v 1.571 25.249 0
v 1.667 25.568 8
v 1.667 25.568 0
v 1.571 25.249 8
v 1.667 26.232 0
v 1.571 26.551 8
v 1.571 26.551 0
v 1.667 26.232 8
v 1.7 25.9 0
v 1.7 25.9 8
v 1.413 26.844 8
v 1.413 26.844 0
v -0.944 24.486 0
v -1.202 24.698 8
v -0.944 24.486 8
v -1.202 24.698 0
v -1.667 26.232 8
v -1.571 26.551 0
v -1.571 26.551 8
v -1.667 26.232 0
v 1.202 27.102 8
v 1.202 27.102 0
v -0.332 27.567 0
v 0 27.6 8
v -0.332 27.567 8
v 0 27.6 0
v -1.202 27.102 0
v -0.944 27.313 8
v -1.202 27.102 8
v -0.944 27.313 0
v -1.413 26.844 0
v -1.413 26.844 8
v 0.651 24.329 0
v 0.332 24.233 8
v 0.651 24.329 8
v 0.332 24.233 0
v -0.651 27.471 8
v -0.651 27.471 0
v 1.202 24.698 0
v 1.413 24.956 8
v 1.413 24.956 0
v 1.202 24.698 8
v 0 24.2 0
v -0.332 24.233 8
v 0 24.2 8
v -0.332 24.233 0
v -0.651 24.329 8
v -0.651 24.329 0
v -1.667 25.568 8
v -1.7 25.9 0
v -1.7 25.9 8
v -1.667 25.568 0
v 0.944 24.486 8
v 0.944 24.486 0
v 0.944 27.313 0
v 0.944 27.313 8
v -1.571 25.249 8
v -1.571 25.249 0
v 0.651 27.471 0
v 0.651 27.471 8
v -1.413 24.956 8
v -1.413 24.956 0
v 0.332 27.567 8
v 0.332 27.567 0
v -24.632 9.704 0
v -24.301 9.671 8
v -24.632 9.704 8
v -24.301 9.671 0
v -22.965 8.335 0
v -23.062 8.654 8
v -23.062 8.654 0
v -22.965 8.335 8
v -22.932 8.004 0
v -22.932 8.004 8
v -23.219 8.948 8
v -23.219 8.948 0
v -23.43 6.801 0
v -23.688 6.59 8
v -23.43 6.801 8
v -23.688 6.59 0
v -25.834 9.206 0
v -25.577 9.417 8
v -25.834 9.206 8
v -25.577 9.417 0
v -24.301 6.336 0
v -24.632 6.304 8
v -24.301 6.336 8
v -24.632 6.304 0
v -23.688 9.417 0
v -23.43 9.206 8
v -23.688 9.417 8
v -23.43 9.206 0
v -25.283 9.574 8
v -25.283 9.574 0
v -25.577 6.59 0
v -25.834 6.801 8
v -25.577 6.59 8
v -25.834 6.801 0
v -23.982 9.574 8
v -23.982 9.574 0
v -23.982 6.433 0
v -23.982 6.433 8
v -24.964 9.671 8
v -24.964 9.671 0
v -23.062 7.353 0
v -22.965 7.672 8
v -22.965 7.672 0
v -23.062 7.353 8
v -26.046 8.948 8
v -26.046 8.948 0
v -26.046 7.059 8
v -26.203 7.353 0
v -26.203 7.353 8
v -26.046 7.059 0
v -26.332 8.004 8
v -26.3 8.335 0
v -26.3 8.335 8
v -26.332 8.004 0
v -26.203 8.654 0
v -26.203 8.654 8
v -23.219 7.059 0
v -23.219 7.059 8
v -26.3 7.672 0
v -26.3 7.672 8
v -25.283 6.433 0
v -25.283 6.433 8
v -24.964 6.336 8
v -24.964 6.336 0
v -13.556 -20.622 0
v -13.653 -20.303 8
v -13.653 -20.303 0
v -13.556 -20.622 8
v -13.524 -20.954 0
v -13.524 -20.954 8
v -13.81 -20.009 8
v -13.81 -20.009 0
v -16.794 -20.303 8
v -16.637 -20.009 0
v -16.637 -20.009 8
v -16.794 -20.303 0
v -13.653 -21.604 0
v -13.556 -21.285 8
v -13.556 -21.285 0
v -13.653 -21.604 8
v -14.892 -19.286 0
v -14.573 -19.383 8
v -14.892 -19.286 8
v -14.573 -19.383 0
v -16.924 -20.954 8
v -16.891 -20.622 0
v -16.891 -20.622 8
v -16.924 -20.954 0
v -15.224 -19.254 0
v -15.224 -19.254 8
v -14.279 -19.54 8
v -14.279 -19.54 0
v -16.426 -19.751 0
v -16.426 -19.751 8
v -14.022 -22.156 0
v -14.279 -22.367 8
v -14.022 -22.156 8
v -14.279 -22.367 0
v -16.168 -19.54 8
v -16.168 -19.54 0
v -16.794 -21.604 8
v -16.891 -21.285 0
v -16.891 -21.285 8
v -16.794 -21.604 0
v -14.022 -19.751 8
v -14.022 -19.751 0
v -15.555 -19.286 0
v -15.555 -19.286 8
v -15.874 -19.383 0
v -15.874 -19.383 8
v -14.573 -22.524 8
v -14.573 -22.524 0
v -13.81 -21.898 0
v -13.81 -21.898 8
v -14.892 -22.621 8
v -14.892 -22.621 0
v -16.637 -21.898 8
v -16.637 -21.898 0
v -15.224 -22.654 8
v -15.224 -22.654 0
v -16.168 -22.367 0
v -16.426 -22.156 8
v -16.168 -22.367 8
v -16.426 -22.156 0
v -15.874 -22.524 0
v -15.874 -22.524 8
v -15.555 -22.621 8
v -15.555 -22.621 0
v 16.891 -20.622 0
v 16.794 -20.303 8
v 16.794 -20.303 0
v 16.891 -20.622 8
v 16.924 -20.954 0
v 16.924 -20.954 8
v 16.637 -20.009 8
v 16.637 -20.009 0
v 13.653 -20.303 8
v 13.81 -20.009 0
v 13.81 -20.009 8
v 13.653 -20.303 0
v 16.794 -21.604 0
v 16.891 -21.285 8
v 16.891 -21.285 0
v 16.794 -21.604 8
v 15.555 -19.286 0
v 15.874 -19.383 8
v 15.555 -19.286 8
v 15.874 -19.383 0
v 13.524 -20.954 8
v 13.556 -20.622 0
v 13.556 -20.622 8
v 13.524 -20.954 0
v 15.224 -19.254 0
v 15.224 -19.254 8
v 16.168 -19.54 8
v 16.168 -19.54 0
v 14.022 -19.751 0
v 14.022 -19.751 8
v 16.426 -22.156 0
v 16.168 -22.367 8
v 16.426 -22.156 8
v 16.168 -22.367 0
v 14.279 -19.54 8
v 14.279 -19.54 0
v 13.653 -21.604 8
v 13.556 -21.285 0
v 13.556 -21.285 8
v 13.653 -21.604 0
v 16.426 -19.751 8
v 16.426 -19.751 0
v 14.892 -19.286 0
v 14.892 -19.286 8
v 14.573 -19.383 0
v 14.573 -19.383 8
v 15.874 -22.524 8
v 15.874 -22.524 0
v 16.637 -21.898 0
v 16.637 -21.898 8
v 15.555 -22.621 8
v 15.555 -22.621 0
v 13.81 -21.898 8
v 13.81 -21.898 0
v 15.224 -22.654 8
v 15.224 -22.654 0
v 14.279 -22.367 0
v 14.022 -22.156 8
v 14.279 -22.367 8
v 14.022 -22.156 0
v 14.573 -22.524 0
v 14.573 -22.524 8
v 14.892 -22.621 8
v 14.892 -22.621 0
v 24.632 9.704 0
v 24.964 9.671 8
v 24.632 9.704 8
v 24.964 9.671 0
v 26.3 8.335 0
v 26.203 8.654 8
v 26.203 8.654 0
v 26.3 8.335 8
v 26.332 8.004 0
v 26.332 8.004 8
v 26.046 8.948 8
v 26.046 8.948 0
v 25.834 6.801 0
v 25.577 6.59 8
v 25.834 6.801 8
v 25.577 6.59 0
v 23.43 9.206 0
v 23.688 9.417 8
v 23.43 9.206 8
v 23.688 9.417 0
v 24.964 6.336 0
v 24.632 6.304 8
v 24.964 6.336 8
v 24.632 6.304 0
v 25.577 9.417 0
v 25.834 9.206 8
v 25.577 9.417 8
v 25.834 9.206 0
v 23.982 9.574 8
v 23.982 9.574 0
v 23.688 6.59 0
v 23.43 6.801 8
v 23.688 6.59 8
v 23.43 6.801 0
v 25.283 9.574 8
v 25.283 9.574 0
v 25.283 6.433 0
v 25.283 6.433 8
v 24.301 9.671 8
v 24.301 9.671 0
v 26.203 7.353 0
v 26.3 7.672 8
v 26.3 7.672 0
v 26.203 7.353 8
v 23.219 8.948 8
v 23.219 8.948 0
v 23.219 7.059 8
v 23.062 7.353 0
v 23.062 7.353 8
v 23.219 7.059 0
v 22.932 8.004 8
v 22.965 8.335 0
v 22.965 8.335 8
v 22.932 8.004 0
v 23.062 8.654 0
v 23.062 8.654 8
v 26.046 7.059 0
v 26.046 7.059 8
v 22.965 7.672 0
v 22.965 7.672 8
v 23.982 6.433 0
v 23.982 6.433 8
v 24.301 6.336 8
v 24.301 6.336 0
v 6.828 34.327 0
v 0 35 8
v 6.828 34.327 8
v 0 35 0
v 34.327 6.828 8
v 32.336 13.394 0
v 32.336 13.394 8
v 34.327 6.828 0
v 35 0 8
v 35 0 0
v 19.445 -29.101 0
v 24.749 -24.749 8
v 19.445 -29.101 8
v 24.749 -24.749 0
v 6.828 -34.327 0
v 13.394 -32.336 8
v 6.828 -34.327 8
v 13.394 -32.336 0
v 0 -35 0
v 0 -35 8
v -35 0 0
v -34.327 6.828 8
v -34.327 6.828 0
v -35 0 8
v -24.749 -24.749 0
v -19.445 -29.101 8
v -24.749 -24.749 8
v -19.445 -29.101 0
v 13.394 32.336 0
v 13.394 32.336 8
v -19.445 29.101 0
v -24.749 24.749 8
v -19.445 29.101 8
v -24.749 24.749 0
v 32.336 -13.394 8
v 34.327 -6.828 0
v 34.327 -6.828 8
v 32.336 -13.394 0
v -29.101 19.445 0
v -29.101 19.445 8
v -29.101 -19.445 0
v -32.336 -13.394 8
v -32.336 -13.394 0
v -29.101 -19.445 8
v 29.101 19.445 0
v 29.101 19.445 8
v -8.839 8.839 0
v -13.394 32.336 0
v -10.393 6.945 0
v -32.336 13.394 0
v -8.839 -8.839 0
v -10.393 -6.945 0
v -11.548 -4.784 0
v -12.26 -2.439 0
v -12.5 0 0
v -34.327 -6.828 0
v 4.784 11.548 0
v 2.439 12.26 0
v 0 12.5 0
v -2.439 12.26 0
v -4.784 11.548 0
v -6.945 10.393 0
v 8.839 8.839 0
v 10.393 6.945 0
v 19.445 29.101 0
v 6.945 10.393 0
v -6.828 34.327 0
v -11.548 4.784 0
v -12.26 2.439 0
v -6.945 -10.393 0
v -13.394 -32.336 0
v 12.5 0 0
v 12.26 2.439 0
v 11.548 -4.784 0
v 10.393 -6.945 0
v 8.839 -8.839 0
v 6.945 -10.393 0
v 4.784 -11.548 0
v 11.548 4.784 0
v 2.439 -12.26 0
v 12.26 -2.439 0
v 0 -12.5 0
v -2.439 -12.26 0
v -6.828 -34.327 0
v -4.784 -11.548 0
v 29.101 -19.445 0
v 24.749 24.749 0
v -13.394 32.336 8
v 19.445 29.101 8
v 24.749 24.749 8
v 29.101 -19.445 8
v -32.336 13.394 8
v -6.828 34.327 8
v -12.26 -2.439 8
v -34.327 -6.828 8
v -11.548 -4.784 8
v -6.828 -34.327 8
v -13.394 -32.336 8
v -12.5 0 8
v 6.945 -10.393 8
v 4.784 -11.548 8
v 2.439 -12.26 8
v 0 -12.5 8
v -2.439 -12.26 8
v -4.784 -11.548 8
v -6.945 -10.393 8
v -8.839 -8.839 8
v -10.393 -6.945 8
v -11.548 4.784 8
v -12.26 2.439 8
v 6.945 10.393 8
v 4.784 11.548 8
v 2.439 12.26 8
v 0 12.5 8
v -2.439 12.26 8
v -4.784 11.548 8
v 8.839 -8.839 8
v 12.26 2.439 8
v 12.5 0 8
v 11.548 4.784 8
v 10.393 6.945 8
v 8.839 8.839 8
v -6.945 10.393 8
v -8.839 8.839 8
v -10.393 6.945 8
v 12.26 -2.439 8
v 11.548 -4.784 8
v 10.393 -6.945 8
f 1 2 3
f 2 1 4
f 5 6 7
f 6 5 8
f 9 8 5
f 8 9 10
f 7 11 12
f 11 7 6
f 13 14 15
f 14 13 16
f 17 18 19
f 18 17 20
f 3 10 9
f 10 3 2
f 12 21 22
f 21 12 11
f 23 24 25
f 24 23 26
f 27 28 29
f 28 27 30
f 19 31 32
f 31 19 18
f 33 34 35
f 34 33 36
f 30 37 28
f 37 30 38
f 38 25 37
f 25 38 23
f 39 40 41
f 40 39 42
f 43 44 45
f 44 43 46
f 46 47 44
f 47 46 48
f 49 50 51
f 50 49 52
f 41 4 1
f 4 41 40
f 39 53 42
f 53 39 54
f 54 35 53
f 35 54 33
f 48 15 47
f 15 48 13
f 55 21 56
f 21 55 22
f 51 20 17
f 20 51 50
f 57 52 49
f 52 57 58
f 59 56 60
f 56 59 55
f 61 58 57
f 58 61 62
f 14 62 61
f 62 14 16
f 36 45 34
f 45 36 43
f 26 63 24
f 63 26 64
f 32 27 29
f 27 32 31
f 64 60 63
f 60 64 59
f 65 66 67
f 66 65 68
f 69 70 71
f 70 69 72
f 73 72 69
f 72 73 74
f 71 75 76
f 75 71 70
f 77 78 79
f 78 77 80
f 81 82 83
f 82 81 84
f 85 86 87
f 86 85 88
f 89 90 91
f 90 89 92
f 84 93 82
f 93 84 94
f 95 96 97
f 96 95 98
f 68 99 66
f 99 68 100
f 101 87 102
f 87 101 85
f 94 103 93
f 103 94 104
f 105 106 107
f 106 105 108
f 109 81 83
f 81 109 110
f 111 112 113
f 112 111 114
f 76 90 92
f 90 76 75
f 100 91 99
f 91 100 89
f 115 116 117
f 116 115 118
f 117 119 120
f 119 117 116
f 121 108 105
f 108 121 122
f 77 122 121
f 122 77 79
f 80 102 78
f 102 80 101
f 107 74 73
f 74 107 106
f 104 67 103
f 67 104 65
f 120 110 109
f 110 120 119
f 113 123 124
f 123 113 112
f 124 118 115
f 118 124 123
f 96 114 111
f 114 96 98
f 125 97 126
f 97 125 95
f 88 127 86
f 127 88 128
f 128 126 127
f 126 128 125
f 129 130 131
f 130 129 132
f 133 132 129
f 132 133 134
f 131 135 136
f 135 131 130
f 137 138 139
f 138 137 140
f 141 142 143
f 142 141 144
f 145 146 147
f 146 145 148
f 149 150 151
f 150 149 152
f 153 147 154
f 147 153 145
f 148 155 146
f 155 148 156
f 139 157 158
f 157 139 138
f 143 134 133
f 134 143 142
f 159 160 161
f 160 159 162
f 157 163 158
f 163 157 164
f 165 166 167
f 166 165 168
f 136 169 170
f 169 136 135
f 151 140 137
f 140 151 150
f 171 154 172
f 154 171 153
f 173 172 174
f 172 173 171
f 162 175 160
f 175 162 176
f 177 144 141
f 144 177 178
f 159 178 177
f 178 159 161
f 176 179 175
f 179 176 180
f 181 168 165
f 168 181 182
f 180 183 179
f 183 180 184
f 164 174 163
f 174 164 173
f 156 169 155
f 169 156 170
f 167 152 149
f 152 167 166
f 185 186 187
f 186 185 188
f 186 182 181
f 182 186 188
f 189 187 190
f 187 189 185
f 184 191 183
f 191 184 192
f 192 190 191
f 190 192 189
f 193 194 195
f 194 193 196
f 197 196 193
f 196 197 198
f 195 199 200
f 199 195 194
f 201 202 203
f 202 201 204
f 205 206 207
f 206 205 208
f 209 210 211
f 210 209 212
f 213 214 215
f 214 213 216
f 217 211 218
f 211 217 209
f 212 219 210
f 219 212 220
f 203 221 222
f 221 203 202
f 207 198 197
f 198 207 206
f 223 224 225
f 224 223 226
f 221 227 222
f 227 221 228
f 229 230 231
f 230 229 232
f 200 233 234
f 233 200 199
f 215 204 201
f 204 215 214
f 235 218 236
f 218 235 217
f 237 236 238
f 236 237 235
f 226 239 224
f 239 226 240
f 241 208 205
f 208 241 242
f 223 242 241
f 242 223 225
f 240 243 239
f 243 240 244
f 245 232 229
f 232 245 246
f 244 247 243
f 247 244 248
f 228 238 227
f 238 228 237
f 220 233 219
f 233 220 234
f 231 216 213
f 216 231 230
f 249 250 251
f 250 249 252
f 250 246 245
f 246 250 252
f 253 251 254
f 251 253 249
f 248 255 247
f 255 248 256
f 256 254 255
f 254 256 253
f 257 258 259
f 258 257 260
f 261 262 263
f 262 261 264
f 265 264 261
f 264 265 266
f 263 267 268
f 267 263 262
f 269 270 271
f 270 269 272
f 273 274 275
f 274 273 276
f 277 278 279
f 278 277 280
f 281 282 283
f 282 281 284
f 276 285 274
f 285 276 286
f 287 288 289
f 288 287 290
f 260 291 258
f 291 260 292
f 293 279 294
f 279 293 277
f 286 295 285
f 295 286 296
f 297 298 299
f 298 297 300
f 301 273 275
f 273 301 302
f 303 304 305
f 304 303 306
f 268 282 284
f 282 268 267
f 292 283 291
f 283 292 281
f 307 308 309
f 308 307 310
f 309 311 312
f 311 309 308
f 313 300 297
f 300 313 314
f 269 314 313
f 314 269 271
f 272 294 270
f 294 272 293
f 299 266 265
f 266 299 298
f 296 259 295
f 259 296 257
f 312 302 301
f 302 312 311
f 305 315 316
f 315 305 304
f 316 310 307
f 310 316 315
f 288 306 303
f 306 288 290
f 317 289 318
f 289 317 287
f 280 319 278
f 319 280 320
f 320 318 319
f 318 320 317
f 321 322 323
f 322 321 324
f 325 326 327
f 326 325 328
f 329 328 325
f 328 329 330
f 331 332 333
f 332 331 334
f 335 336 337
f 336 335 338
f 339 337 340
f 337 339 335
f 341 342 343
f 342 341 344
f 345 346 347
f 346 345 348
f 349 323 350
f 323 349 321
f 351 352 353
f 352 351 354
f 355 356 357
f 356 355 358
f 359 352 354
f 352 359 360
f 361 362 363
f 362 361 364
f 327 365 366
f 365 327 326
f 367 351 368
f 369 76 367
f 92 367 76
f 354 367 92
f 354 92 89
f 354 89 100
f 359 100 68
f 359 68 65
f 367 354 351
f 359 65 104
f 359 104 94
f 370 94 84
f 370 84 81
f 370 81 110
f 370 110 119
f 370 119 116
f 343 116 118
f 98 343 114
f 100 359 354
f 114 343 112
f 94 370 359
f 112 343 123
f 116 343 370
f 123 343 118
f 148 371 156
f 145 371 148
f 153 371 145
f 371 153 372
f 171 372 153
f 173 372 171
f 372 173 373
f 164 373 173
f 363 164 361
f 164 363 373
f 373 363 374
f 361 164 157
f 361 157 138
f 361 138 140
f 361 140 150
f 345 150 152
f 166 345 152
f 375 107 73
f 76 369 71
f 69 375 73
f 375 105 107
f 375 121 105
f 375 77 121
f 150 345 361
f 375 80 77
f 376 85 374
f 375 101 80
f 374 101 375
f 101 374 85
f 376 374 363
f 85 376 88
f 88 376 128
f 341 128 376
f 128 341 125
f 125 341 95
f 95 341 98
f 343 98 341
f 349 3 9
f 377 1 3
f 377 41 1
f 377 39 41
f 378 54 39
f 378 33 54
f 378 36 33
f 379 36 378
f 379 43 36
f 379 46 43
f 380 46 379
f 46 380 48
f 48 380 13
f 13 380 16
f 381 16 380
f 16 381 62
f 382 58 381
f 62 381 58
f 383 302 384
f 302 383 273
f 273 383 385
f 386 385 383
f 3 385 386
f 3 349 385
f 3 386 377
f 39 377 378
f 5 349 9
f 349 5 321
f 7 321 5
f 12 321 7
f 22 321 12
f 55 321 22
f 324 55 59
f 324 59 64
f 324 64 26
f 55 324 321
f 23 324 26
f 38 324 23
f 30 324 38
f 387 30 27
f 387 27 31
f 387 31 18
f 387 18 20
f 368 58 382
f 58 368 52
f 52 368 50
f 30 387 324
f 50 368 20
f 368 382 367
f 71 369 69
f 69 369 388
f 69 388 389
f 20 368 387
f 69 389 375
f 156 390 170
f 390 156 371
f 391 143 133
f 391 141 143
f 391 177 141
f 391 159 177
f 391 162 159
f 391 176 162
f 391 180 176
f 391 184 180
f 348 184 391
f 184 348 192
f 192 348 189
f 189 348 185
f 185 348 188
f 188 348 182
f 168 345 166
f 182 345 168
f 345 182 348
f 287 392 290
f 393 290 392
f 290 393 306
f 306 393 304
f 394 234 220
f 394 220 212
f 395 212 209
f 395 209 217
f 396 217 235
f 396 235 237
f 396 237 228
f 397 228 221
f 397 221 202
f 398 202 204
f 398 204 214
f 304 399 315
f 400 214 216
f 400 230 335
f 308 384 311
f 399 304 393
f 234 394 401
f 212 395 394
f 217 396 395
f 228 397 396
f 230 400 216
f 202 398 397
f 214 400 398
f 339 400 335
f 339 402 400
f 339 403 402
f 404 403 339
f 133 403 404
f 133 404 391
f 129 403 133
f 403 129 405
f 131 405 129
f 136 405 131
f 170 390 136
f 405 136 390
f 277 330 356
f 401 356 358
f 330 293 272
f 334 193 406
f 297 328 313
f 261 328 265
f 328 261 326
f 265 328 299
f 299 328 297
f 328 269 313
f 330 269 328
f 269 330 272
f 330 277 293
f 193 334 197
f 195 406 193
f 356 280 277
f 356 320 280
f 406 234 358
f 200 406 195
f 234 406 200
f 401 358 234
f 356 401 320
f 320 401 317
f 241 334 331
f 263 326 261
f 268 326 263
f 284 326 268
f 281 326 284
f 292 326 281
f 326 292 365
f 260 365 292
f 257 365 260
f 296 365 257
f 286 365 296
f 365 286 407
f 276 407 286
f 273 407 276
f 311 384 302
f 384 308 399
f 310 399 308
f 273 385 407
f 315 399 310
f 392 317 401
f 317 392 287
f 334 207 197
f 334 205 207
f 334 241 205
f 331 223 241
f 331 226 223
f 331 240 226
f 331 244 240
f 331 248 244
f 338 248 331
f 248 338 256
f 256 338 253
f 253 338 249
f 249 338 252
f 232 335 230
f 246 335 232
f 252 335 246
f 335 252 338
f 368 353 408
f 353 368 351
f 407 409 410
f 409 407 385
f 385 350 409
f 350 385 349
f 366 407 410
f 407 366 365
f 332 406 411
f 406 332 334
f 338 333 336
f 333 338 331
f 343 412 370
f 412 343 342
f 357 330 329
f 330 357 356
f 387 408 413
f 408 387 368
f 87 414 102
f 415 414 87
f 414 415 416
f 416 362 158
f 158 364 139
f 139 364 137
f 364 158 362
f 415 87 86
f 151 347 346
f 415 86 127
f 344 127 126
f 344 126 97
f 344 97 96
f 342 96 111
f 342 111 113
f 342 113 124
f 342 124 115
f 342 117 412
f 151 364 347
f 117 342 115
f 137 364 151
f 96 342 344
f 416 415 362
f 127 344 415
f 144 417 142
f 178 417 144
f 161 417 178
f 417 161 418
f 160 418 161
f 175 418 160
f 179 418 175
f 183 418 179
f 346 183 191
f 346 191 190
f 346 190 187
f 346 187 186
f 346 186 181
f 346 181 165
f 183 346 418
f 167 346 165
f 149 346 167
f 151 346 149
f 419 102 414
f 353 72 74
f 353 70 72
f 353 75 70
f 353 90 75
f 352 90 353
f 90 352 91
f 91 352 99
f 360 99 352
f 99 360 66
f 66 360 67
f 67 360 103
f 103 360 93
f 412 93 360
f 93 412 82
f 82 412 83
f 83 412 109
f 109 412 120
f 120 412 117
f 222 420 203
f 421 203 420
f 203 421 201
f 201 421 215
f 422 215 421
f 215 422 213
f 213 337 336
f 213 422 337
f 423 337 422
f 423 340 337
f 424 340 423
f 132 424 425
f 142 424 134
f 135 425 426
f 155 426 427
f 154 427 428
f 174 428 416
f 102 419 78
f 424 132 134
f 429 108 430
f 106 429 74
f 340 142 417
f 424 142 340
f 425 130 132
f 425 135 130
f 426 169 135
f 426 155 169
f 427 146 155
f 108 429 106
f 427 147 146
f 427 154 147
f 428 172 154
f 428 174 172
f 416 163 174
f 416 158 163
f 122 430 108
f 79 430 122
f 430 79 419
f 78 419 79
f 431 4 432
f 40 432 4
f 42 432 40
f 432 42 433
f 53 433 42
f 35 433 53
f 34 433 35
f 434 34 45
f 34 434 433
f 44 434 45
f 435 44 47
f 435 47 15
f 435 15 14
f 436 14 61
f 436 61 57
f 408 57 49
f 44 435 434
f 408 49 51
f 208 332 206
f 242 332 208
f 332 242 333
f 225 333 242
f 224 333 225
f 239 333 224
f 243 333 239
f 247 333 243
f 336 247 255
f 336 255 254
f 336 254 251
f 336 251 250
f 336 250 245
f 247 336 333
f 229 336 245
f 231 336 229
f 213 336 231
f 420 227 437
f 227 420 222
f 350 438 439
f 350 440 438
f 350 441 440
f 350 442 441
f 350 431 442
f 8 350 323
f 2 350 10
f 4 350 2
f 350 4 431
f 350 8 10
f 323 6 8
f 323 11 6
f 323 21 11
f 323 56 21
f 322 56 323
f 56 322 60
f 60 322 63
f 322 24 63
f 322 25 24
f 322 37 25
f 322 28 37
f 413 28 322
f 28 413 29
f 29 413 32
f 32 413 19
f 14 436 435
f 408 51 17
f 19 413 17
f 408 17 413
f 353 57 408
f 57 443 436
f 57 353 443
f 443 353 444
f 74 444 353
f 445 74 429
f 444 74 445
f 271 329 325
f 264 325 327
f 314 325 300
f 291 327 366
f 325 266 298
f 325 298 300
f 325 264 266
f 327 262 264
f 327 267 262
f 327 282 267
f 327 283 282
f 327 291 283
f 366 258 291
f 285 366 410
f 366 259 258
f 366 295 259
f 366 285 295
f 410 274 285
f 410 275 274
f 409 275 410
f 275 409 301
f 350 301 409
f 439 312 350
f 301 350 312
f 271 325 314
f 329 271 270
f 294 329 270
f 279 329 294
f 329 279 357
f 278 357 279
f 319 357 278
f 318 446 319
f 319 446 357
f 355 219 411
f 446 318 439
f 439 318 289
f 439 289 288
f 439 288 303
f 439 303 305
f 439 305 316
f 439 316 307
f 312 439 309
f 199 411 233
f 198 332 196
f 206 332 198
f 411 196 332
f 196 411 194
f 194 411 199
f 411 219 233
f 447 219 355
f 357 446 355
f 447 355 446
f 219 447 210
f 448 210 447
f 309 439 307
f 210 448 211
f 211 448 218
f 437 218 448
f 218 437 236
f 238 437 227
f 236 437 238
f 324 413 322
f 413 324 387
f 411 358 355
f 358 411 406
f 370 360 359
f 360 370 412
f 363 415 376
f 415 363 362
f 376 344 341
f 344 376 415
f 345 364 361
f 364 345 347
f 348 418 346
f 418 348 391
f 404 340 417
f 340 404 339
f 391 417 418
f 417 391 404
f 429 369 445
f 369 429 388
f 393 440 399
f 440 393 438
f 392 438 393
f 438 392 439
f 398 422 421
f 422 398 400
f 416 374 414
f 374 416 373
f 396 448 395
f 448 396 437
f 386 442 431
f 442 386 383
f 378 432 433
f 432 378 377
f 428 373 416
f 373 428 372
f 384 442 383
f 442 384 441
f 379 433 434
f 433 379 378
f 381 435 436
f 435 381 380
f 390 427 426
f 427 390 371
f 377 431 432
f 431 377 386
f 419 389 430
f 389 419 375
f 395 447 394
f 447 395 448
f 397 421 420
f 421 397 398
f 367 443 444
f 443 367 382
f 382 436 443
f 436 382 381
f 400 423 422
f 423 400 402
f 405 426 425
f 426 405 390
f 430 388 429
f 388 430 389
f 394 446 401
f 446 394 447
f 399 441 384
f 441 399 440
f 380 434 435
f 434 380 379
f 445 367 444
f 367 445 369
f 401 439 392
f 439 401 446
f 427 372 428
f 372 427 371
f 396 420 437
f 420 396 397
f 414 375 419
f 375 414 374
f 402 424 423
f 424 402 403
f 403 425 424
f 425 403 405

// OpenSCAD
$fn = 32;

// ----------------------------------------------------------------------
// Flange Ø70 x 8
// 5 holes on a Ø51.8 bolt circle, bolted joints
// ----------------------------------------------------------------------

// --- parameters (mm) ---
flange_d = 70;   // outside diameter of the flange
thickness = 8;   // flange thickness
holes = 5;       // number of bolt holes
pcd = 51.8;      // bolt circle diameter
start_deg = 90;  // angle of the first hole, from +X
hole_d = 3.4;    // bolt hole diameter
bore_d = 25;     // central through bore
hub_d = 35;      // hub outside diameter
hub_h = 0;       // hub height above the flange face (0 = no hub)

// --- derived feature positions (mm) ---
height = thickness + hub_h;  // = 8   overall height of the part
pcd_r = pcd / 2;             // = 25.9   bolt circle radius
hole_step = 360 / holes;     // = 72   angular pitch
feature_centers = [
  [pcd_r * cos(start_deg + 0 * hole_step), pcd_r * sin(start_deg + 0 * hole_step)],
  [pcd_r * cos(start_deg + 1 * hole_step), pcd_r * sin(start_deg + 1 * hole_step)],
  [pcd_r * cos(start_deg + 2 * hole_step), pcd_r * sin(start_deg + 2 * hole_step)],
  [pcd_r * cos(start_deg + 3 * hole_step), pcd_r * sin(start_deg + 3 * hole_step)],
  [pcd_r * cos(start_deg + 4 * hole_step), pcd_r * sin(start_deg + 4 * hole_step)]
];   // bolt hole centres on the pitch circle

// flange disc, every hole and the bore cut straight through
difference() {
  union() {
    cylinder(d = flange_d, h = thickness);
  }
  translate([0, 0, -1]) cylinder(d = bore_d, h = height + 2);  // bore, through
  for (centre = feature_centers)
    translate([centre[0], centre[1], -1]) cylinder(d = hole_d, h = thickness + 2);
}
